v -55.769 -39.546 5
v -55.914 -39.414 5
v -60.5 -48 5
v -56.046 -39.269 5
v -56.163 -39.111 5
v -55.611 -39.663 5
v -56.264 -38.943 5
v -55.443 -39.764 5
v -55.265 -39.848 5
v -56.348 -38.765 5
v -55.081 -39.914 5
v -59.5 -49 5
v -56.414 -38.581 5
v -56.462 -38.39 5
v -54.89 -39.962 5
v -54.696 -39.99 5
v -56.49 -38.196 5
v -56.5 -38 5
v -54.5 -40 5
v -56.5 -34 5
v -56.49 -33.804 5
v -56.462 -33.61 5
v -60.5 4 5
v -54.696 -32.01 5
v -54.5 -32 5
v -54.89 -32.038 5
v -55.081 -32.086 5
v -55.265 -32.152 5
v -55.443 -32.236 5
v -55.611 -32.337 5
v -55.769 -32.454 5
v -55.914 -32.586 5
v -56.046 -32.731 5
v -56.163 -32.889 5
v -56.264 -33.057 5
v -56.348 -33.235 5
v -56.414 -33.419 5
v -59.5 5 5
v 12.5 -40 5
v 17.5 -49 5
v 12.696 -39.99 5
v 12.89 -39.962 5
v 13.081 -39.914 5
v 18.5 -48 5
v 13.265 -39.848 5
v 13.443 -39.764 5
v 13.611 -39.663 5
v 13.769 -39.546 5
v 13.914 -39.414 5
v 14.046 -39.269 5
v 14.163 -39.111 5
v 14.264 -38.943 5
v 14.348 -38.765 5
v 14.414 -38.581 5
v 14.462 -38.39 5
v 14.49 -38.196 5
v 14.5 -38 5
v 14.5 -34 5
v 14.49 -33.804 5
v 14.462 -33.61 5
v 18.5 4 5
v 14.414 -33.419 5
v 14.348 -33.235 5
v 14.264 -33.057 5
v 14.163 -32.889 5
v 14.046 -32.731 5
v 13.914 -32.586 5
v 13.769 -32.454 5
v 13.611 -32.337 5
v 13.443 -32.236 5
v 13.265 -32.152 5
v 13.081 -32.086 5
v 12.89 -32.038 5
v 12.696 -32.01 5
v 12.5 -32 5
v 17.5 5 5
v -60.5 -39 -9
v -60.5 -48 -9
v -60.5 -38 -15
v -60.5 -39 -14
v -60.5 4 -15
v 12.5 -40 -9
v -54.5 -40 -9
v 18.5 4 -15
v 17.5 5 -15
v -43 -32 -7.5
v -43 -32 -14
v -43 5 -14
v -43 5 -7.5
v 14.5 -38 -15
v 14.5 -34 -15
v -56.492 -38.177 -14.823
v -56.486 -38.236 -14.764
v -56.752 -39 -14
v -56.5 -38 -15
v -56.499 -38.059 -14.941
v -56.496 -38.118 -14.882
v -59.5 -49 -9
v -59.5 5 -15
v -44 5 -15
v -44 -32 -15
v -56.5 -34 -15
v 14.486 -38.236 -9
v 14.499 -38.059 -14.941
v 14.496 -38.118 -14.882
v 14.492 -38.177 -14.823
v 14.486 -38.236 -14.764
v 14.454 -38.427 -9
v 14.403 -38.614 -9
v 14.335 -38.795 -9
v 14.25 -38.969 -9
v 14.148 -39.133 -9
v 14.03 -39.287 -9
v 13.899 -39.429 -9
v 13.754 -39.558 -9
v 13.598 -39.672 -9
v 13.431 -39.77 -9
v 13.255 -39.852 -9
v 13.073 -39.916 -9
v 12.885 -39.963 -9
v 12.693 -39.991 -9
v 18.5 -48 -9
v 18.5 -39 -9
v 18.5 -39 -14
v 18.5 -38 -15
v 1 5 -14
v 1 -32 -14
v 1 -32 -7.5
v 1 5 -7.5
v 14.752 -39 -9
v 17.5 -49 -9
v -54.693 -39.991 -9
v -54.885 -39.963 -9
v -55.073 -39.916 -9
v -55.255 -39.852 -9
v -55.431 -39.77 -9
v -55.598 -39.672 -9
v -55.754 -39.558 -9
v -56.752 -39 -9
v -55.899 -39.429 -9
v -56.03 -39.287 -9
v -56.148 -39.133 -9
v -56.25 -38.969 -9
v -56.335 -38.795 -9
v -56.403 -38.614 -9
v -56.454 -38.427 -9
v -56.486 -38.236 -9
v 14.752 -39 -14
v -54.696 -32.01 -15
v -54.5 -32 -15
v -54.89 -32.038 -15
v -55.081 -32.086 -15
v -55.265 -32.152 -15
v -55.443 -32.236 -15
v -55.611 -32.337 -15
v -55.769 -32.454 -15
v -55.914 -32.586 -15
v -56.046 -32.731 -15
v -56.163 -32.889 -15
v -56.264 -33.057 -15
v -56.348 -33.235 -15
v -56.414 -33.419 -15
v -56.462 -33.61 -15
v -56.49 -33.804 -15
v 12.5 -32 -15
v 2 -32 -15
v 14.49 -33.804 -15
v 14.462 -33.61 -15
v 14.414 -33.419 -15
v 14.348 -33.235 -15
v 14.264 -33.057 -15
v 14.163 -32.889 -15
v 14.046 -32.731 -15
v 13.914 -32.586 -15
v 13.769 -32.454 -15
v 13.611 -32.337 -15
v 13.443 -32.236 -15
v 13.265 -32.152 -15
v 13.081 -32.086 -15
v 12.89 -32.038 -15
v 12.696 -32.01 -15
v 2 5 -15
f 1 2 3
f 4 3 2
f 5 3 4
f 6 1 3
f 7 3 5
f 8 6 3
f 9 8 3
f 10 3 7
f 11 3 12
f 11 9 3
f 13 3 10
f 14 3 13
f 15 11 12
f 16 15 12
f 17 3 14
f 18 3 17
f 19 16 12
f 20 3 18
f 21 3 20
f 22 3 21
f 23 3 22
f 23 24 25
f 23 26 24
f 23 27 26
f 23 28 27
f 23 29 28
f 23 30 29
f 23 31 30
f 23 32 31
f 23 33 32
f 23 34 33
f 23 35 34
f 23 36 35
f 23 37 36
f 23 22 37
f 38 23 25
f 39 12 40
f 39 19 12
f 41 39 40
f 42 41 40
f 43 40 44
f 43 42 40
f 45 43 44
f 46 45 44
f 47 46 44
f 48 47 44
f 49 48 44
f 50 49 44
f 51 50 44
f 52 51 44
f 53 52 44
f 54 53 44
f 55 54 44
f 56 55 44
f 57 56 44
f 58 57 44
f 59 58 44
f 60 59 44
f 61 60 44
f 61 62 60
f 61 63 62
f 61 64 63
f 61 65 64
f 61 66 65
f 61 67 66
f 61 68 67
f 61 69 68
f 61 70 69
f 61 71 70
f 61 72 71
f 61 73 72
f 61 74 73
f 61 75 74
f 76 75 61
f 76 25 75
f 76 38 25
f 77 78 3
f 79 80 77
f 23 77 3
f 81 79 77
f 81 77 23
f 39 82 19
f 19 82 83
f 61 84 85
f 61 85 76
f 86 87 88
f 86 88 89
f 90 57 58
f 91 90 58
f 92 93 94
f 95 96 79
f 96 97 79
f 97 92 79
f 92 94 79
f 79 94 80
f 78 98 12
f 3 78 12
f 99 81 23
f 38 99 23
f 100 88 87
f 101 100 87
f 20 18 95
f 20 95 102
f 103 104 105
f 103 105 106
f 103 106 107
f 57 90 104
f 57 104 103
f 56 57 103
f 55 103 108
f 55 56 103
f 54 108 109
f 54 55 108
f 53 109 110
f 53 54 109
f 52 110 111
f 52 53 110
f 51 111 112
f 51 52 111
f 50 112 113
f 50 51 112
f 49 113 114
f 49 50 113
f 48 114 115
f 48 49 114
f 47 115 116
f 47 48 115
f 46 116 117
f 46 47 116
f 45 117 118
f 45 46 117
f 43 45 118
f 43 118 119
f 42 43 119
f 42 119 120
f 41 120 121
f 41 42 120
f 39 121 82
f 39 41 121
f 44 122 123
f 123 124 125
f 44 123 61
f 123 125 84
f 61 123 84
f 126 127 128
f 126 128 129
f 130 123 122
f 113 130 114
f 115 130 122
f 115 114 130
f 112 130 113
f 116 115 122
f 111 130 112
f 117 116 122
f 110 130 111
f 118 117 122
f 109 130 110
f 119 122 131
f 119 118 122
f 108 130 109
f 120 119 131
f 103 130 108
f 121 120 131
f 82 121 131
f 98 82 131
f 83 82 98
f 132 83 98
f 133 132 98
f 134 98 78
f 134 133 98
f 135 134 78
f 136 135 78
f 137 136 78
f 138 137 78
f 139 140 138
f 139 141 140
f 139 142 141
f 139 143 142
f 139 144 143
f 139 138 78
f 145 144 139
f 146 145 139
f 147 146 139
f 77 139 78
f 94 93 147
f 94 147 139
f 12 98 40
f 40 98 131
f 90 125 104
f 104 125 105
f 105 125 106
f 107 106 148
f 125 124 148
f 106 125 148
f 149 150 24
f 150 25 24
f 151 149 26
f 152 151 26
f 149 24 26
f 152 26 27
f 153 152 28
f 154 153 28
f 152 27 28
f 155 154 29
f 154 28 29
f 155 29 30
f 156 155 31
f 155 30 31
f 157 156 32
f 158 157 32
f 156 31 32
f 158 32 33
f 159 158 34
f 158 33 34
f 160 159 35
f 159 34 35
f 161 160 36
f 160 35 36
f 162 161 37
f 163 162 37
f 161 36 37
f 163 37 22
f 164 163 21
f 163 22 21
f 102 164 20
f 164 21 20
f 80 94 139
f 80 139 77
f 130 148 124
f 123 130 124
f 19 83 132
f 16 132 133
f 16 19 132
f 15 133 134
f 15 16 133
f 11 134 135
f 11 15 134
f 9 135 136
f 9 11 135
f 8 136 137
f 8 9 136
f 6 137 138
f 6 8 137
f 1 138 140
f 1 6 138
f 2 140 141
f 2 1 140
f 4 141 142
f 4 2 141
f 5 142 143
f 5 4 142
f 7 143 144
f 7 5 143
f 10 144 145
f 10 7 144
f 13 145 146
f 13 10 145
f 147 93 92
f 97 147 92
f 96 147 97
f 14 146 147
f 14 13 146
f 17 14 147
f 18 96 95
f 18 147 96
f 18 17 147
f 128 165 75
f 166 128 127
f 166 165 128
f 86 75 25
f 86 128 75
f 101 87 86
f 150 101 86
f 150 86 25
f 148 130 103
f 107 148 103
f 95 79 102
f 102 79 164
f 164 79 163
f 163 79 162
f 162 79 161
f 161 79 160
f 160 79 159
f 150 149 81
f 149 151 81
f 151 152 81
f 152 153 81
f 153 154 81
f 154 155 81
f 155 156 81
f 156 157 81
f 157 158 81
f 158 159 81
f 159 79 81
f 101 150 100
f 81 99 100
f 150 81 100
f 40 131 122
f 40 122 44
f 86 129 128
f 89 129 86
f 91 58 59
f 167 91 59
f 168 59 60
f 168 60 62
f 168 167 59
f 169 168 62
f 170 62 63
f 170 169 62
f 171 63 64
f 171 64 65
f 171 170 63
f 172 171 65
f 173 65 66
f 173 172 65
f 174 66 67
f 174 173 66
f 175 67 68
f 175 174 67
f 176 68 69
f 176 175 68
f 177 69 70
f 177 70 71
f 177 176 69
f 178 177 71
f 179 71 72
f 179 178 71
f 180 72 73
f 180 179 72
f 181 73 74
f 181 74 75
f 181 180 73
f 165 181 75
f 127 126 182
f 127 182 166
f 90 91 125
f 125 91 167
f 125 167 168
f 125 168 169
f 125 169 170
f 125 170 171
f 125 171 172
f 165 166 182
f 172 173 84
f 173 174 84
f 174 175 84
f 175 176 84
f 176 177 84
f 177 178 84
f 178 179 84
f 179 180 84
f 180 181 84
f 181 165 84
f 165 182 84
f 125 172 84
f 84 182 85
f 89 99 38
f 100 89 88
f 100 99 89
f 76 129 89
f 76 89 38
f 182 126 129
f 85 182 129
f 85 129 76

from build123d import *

# Parameters (mm, degrees)
BOSS_EXTRUDE1_DEPTH      = 5
BOSS_EXTRUDE1_DEPTH_BACK = 15
SKETCH1_W                = 79
SKETCH1_H                = 54
SKETCH3_W                = 79
SKETCH3_H                = 10
CUT_EXTRUDE1_DEPTH       = 1
SKETCH4_W                = 71
SKETCH4_H                = 8
CUT_EXTRUDE2_DEPTH       = 15
SKETCH5_W                = 44
SKETCH5_H                = 35
CUT_EXTRUDE3_DEPTH       = 2.5
SKETCH6_W                = 44
SKETCH6_H                = 2.5
CUT_EXTRUDE4_DEPTH       = 80.907759323
SKETCH7_W                = 71
SKETCH7_H                = 8
CUT_EXTRUDE5_DEPTH       = 80.285875161
SKETCH8_W                = 44
SKETCH8_H                = 37
CUT_EXTRUDE6_DEPTH       = 5
CUT_EXTRUDE7_DEPTH       = 5
FILLET1_R                = 2
CHAMFER2_SIZE            = 1
CHAMFER3_SIZE            = 1
CHAMFER4_SIZE            = 1


with BuildPart() as part:
    # Sketch1 → Boss-Extrude1 (new, two sides: drawn at the far end of the back side and taken through both)
    with BuildSketch(Plane.XY.offset(-BOSS_EXTRUDE1_DEPTH_BACK)):
        with Locations((-21, -22)):
            Rectangle(SKETCH1_W, SKETCH1_H)
    extrude(amount=BOSS_EXTRUDE1_DEPTH + BOSS_EXTRUDE1_DEPTH_BACK)

    # Sketch3 → Cut-Extrude1 (cut)
    with BuildSketch(Plane(origin=(0, 0, -15), x_dir=(-1, 0, 0), z_dir=(0, 0, -1))):
        with Locations((21, -44)):
            Rectangle(SKETCH3_W, SKETCH3_H)
    extrude(amount=-CUT_EXTRUDE1_DEPTH, mode=Mode.SUBTRACT)

    # Sketch4 → Cut-Extrude2 (cut)
    with BuildSketch(Plane(origin=(0, 0, -15), x_dir=(-1, 0, 0), z_dir=(0, 0, -1))):
        with Locations((21, -36)):
            Rectangle(SKETCH4_W, SKETCH4_H)
    extrude(amount=-CUT_EXTRUDE2_DEPTH, mode=Mode.SUBTRACT)

    # Sketch5 → Cut-Extrude3 (cut)
    with BuildSketch(Plane(origin=(0, 0, -15), x_dir=(-1, 0, 0), z_dir=(0, 0, -1))):
        with Locations((21, -16.5)):
            Rectangle(SKETCH5_W, SKETCH5_H)
    extrude(amount=-CUT_EXTRUDE3_DEPTH, mode=Mode.SUBTRACT)

    # Sketch6 → Cut-Extrude4 (cut, through all)
    with BuildSketch(Plane.XZ.offset(-1)):
        with Locations((-21, -13.75)):
            Rectangle(SKETCH6_W, SKETCH6_H)
    extrude(amount=-CUT_EXTRUDE4_DEPTH, mode=Mode.SUBTRACT)

    # Sketch7 → Cut-Extrude5 (cut, through all)
    with BuildSketch(Plane(origin=(0, 0, 0), x_dir=(-1, 0, 0), z_dir=(0, 0, -1))):
        with Locations((21, -36)):
            Rectangle(SKETCH7_W, SKETCH7_H)
    extrude(amount=-CUT_EXTRUDE5_DEPTH, mode=Mode.SUBTRACT)

    # Sketch8 → Cut-Extrude6 (cut)
    with BuildSketch(Plane(origin=(0, 0, -12.5), x_dir=(-1, 0, 0), z_dir=(0, 0, -1))):
        with Locations((21, -13.5)):
            Rectangle(SKETCH8_W, SKETCH8_H)
    extrude(amount=-CUT_EXTRUDE6_DEPTH, mode=Mode.SUBTRACT)

    # Sketch9 → Cut-Extrude7 (cut)
    with BuildSketch(Plane(origin=(0, 0, -14), x_dir=(-1, 0, 0), z_dir=(0, 0, -1))):
        Polygon((56.5, -40), (-14.5, -40), (-14.5, -39), (-18.5, -39), (-18.5, -49), (60.5, -49), (60.5, -39), (56.5, -39), align=None)
    extrude(amount=-CUT_EXTRUDE7_DEPTH, mode=Mode.SUBTRACT)

    # Fillet1
    fillet1_edges = [part.edges().sort_by_distance(p)[0] for p in [
        (14.5, -40, -2),
        (14.5, -32, -5),
        (-56.5, -32, -5),
        (-56.5, -40, -2),
    ]]
    fillet(fillet1_edges, radius=FILLET1_R)

    # Chamfer1
    # the kernel refuses this chamfer: 1, 0.732050808 mm, written as the material it takes off along each edge
    with BuildSketch(Plane(origin=(14.232050808, -39, -9), x_dir=(0.9974998388550008, -0.07066874474792476, 0), z_dir=(0, 0, -1))) as chamfer1_piece_1:
        with BuildLine():
            Line((0.534510572, 0), (0.183539981, -0.816493036))
            Line((0.183539981, -0.816493036), (0.163562724, -0.817446573))
            ThreePointArc((0.163562724, -0.817446573), (0.12384643, -0.40032394), (-0.017983891, -0.00875098))
            Line((-0.017983891, -0.00875098), (0.001413375, 0.019949997))
            ThreePointArc((0.001413375, 0.019949997), (0.267333969, 0.001110621), (0.535923947, 0.019949997))
            Line((0.535923947, 0.019949997), (0.534510572, 0))
        make_face()
    extrude(amount=8.092169631, mode=Mode.SUBTRACT)
    with BuildSketch(Plane(origin=(-56.232050808, -39, -17.092169631), x_dir=(-0.2877176347633081, 0.9577152826629675, 0), z_dir=(0, 0, 1))) as chamfer1_piece_2:
        with BuildLine():
            Line((0.836867853, 0), (0.11722766, 0.521497102))
            Line((0.11722766, 0.521497102), (0.098073354, 0.527251455))
            ThreePointArc((0.098073354, 0.527251455), (0.057547506, 0.261068897), (-0.019154306, 0.005754353))
            Line((-0.019154306, 0.005754353), (0.004593737, -0.019465292))
            ThreePointArc((0.004593737, -0.019465292), (0.417739168, 0.033033052), (0.833416807, -0.019700007))
            Line((0.833416807, -0.019700007), (0.836867853, 0))
        make_face()
    extrude(amount=8.092169631, mode=Mode.SUBTRACT)

    # Chamfer2
    chamfer2_edges = [part.edges().sort_by_distance(p)[0] for p in [
        (1, -13.5, -15),
        (-43, -13.5, -15),
    ]]
    chamfer(chamfer2_edges, length=CHAMFER2_SIZE)

    # Chamfer3
    chamfer3_edges = [part.edges().sort_by_distance(p)[0] for p in [
        (18.5, -49, -2),
        (-60.5, -49, -2),
        (-60.5, 5, -5),
        (18.5, 5, -5),
    ]]
    chamfer(chamfer3_edges, length=CHAMFER3_SIZE)

    # Chamfer4
    chamfer4_edges = [part.edges().sort_by_distance(p)[0] for p in [
        (-58.626032501, -39, -15),
        (16.626032501, -39, -15),
    ]]
    chamfer(chamfer4_edges, length=CHAMFER4_SIZE)


solid = part.part
